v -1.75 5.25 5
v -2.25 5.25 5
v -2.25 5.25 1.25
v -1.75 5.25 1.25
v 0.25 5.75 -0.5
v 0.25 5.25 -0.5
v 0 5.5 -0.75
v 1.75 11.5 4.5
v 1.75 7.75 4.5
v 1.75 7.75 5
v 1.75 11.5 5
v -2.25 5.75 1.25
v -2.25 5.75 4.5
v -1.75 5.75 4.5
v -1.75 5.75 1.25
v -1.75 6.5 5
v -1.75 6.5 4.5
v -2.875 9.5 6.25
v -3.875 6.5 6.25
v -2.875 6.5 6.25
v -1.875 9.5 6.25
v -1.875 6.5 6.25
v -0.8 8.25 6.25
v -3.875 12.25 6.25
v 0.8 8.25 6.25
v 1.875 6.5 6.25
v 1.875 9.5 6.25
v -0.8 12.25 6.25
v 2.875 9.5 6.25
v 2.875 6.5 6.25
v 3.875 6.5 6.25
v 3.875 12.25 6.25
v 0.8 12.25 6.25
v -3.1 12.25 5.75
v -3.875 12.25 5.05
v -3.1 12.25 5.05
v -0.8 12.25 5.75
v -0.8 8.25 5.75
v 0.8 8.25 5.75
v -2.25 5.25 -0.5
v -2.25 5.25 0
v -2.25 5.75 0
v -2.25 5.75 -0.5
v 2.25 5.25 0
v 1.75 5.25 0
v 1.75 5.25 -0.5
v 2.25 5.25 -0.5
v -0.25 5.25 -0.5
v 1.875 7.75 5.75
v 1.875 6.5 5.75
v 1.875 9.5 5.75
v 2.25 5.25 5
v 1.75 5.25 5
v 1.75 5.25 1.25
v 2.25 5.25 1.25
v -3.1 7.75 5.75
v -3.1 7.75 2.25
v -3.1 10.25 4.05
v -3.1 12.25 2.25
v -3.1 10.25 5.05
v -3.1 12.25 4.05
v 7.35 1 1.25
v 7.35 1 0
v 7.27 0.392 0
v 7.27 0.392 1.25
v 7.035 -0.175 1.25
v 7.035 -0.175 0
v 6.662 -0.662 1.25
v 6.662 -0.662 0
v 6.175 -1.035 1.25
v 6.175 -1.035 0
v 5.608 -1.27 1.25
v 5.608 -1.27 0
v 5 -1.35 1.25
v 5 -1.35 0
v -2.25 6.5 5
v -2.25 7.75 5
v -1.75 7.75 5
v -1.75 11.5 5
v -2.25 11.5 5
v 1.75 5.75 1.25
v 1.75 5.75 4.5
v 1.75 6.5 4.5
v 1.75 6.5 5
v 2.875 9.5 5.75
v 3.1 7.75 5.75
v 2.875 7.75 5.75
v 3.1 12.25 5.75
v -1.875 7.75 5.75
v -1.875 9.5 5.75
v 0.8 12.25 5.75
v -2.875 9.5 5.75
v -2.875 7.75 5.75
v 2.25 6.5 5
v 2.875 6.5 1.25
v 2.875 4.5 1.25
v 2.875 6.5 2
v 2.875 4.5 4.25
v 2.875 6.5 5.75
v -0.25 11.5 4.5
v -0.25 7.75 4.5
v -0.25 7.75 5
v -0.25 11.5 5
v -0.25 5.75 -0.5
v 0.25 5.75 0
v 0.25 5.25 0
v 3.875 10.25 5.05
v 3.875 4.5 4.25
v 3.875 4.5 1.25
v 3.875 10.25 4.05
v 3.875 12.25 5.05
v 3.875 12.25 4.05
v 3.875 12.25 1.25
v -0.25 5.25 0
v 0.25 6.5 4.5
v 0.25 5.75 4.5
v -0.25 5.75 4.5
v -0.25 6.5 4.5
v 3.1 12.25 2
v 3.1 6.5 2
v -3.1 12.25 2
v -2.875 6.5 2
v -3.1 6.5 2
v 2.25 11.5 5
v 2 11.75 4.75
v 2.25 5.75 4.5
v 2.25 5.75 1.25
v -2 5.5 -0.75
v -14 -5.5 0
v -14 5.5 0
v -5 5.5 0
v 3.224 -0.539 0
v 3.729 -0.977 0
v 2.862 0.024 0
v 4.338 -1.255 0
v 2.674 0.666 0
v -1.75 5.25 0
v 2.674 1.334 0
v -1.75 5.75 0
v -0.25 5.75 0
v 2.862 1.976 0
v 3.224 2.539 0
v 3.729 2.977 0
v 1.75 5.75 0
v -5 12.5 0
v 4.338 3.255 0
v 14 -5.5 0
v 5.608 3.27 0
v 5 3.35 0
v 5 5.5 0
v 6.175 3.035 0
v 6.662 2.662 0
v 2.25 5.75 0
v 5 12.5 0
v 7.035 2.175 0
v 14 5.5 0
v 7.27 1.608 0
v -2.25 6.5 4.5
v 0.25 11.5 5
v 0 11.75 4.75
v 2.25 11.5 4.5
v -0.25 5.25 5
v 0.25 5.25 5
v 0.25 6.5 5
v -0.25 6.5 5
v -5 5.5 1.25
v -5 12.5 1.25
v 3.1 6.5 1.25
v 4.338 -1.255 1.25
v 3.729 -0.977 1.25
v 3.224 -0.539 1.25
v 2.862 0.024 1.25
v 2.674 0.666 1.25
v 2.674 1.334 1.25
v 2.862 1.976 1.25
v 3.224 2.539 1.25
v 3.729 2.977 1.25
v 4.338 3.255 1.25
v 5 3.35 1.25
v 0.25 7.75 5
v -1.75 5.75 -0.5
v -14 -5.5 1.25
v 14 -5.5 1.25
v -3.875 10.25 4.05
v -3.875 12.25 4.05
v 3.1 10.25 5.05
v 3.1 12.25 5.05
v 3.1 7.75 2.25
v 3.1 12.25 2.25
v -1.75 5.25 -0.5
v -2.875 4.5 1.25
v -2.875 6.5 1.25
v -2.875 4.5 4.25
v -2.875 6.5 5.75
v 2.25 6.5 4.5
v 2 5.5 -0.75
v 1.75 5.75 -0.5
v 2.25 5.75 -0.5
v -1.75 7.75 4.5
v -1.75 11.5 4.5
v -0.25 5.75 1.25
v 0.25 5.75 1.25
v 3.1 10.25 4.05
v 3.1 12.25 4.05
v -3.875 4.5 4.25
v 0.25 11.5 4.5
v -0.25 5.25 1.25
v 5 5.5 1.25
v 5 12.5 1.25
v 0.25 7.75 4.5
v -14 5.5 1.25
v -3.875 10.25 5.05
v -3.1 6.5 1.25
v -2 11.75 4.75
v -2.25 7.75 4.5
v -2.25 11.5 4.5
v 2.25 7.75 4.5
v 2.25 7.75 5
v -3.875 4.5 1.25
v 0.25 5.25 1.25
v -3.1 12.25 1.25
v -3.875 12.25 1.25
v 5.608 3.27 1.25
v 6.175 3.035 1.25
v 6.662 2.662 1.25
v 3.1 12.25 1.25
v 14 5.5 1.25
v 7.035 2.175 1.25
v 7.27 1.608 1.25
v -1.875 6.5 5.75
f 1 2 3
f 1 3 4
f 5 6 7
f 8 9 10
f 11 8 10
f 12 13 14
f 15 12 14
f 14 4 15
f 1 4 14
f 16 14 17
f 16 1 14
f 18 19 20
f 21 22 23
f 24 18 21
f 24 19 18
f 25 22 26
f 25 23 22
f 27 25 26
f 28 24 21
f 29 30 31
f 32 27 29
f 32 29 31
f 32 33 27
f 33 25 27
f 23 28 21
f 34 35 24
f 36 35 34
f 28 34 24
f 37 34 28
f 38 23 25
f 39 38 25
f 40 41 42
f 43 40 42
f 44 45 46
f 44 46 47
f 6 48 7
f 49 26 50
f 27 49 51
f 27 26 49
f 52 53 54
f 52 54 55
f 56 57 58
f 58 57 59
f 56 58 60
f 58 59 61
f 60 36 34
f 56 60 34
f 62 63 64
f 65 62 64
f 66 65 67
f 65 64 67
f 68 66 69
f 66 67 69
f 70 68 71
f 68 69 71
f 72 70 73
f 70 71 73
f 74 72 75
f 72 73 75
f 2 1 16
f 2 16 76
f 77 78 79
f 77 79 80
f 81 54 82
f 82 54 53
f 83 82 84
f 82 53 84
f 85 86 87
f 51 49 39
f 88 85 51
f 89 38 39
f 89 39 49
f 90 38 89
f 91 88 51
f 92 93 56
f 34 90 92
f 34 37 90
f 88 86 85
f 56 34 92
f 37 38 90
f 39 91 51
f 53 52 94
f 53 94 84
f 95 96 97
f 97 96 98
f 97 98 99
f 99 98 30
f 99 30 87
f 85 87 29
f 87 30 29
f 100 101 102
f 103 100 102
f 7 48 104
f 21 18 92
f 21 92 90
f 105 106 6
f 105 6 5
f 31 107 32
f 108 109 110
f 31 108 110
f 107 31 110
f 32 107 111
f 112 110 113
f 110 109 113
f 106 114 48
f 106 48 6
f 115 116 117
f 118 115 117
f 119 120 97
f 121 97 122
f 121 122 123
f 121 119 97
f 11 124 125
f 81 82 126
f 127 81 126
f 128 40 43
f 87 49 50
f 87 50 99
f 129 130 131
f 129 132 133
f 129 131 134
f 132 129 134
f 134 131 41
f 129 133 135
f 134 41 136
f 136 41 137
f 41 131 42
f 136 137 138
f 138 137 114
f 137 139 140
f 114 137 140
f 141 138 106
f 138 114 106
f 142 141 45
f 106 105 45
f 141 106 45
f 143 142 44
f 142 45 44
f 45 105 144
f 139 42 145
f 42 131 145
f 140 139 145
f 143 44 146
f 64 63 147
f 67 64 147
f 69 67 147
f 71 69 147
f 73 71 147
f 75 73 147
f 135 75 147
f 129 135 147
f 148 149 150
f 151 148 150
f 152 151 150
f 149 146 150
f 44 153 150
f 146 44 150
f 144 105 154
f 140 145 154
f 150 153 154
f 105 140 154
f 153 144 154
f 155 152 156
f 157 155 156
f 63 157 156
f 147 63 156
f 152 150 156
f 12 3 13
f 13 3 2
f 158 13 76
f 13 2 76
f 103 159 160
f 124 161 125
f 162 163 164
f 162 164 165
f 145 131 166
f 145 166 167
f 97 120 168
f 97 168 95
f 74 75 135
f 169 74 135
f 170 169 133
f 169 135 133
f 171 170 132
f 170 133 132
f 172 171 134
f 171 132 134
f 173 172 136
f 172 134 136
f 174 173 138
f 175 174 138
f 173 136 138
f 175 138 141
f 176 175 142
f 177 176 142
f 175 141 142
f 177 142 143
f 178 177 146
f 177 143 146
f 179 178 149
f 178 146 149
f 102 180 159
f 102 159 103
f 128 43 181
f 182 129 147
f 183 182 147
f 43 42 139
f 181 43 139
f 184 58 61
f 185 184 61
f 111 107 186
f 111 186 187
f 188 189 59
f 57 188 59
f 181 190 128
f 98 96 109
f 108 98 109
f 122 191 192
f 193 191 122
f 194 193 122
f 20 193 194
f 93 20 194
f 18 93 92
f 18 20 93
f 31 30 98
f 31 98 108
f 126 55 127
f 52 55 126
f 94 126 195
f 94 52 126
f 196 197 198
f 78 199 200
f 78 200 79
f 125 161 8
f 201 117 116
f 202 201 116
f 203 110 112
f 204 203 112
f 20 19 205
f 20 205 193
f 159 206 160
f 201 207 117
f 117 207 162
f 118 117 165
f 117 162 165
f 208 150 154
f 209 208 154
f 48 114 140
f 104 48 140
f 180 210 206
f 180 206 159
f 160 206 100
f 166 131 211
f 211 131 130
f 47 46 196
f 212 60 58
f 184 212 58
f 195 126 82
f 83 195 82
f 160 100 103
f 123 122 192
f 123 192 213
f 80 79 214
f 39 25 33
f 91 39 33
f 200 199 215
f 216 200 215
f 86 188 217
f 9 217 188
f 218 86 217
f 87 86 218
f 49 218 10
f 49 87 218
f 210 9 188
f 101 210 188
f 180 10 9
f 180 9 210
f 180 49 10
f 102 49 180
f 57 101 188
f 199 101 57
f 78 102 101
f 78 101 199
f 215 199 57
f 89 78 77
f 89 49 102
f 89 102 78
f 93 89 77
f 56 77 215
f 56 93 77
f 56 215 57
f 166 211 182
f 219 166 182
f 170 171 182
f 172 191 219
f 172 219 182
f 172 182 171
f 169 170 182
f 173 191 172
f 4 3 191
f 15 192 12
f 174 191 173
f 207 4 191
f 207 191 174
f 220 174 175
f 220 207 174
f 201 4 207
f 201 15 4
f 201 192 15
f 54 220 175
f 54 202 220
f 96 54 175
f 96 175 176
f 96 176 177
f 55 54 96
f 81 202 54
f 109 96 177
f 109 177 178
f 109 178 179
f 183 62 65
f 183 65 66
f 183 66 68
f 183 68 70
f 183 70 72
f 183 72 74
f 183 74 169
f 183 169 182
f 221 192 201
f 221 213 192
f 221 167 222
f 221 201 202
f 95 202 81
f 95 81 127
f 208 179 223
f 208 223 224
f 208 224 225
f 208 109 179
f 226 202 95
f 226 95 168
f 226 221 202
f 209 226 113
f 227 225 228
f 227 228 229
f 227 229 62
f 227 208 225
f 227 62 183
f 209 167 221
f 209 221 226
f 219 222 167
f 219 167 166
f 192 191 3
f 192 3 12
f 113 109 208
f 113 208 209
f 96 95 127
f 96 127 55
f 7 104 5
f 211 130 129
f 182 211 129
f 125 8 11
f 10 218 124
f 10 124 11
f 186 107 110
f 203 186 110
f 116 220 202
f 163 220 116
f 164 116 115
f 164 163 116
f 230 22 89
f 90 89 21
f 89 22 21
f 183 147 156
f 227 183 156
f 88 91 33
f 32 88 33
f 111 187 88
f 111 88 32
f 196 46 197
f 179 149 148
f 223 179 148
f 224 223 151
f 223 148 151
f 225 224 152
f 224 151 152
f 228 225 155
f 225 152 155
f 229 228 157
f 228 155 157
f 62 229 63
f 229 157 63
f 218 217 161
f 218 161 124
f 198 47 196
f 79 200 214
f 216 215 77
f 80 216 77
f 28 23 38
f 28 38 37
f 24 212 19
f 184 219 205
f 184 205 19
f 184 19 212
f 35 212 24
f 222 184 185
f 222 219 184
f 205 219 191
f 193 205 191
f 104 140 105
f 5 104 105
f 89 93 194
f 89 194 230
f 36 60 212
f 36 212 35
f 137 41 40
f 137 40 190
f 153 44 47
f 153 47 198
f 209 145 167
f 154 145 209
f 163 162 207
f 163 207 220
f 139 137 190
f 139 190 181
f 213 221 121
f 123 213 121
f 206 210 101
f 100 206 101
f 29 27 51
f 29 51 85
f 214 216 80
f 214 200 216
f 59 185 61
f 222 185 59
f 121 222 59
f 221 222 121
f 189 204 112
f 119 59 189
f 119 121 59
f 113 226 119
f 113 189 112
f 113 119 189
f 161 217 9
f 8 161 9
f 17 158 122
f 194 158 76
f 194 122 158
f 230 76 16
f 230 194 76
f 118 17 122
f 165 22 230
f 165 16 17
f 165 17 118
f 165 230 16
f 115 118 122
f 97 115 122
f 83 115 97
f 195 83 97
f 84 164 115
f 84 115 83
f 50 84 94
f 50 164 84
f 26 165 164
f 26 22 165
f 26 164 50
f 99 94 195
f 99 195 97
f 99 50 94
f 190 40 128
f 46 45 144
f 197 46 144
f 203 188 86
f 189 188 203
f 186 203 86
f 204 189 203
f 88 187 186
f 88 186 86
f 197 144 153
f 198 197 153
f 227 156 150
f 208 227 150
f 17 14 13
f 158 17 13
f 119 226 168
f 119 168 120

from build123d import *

# Parameters (mm, degrees)
CROQUIS1_W          = 10
CROQUIS1_H          = 7
EXTRUIR1_DEPTH      = 1.25
CROQUIS2_W          = 7.75
CROQUIS2_H          = 7.75
EXTRUIR2_DEPTH      = 5
CROQUIS3_W          = 6.199548142
CROQUIS3_H          = 3.5
EXTRUIR3_DEPTH      = 4.5
CROQUIS4_W          = 5.75
CROQUIS4_H          = 2
EXTRUIR4_DEPTH      = 5
CHAFL_N1_SIZE       = 2
CROQUIS5_W          = 6.199548142
CROQUIS5_H          = 0.75
EXTRUIR5_DEPTH      = 5.75
CROQUIS6_W          = 1
CROQUIS6_H          = 3
CROQUIS6_W_2        = 0.8
CROQUIS6_H_2        = 4
EXTRUIR6_DEPTH      = 0.5
EXTRUIR7_REACH      = 24.69
CROQUIS7_W          = 1
CROQUIS7_H          = 2
EXTRUIR8_DEPTH      = 4
EXTRUIR8_DEPTH_BACK = 2.5
CROQUIS8_W          = 0.5
CROQUIS8_H          = 0.5
CHAFL_N2_SIZE       = 0.25
CROQUIS9_W          = 0.5
CROQUIS9_H          = 0.5
EXTRUIR9_DEPTH      = 5.75
CHAFL_N3_SIZE       = 0.25


with BuildPart() as part:
    # Croquis1 → Extruir1 (new body)
    with BuildSketch(Plane.XY):
        with BuildLine():
            Line((-14, -5.5), (14, -5.5))
            Line((14, -5.5), (14, 5.5))
            Line((14, 5.5), (5, 5.5))
            Line((5, 5.5), (5, 3.35))
            ThreePointArc((5, 3.35), (6.661700936, 2.661700936), (7.35, 1))
            ThreePointArc((7.35, 1), (6.661700936, -0.661700936), (5, -1.35))
            Line((5, -1.35), (5, -1.5))
            Line((5, -1.5), (-5, -1.5))
            Line((-5, -1.5), (-5, 5.5))
            Line((-5, 5.5), (-14, 5.5))
            Line((-14, 5.5), (-14, -5.5))
        make_face()
        with Locations((0, 9)):
            Rectangle(CROQUIS1_W, CROQUIS1_H)
        with BuildLine():
            Line((5, 3.35), (5, 5.5))
            Line((5, 5.5), (-5, 5.5))
            Line((-5, 5.5), (-5, -1.5))
            Line((-5, -1.5), (5, -1.5))
            Line((5, -1.5), (5, -1.35))
            ThreePointArc((5, -1.35), (2.65, 1), (5, 3.35))
        make_face()
    extrude(amount=EXTRUIR1_DEPTH)

    # Croquis2 → Extruir2 (add)
    with BuildSketch(Plane.XY.offset(1.25)):
        with Locations((0, 8.375)):
            Rectangle(CROQUIS2_W, CROQUIS2_H)
    extrude(amount=EXTRUIR2_DEPTH)

    # Croquis3 → Extruir3 (cut)
    with BuildSketch(Plane(origin=(0, 12.25, 0), x_dir=(-1, 0, 0), z_dir=(0, 1, 0))):
        with Locations((0, 4)):
            Rectangle(CROQUIS3_W, CROQUIS3_H)
    extrude(amount=-EXTRUIR3_DEPTH, mode=Mode.SUBTRACT)

    # Croquis4 → Extruir4 (cut)
    with BuildSketch(Plane.XY.offset(6.25)):
        with Locations((0, 5.5)):
            Rectangle(CROQUIS4_W, CROQUIS4_H)
    extrude(amount=-EXTRUIR4_DEPTH, mode=Mode.SUBTRACT)

    # Chaflán1
    chafl_n1_edges = [part.edges().sort_by_distance(p)[0] for p in [
        (3.375, 4.5, 6.25),
        (-3.375, 4.5, 6.25),
    ]]
    chamfer(chafl_n1_edges, length=CHAFL_N1_SIZE)

    # Croquis5 → Extruir5 (cut)
    with BuildSketch(Plane(origin=(0, 12.25, 0), x_dir=(-1, 0, 0), z_dir=(0, 1, 0))):
        with Locations((0, 1.625)):
            Rectangle(CROQUIS5_W, CROQUIS5_H)
    extrude(amount=-EXTRUIR5_DEPTH, mode=Mode.SUBTRACT)

    # Croquis6 → Extruir6 (cut)
    with BuildSketch(Plane.XY.offset(6.25)):
        with Locations((-2.375, 8)):
            Rectangle(CROQUIS6_W, CROQUIS6_H)
        with Locations((0.4, 10.25)):
            Rectangle(CROQUIS6_W_2, CROQUIS6_H_2)
        with Locations((-0.4, 10.25)):
            Rectangle(CROQUIS6_W_2, CROQUIS6_H_2)
        with Locations((2.375, 8)):
            Rectangle(CROQUIS6_W, CROQUIS6_H)
    extrude(amount=-EXTRUIR6_DEPTH, mode=Mode.SUBTRACT)

    # Extruir7: up to this face of the body (flat: up to its plane)
    extruir7_end = Plane(part.part.faces().sort_by_distance((-3.875, 8.549603175, 3.650226757))[0])
    # Croquis7 → Extruir7 (cut, up to the picked face)
    with BuildSketch(Plane(origin=(3.875, 0, 0), x_dir=(0, 0, -1), z_dir=(1, 0, 0)), mode=Mode.PRIVATE) as extruir7_sk1:
        with Locations((-4.55, 11.25)):
            Rectangle(CROQUIS7_W, CROQUIS7_H)
    extruir7_tool1 = split(extrude(extruir7_sk1.sketch, amount=-EXTRUIR7_REACH, mode=Mode.PRIVATE), bisect_by=extruir7_end, keep=Keep.BOTH, mode=Mode.PRIVATE)
    add(extruir7_tool1.solids().sort_by(Axis((3.875, 11.25, 4.55), (-1, 0, 0)))[0], mode=Mode.SUBTRACT)

    # Croquis8 → Extruir8 (add, two sides: drawn at the far end of the back side and taken through both)
    with BuildSketch(Plane(origin=(0, 7.75, 0), x_dir=(-1, 0, 0), z_dir=(0, 1, 0)).offset(-EXTRUIR8_DEPTH_BACK)):
        with Locations((0, 4.75)):
            Rectangle(CROQUIS8_W, CROQUIS8_H)
        with Locations((2, 4.75)):
            Rectangle(CROQUIS8_W, CROQUIS8_H)
        with Locations((-2, 4.75)):
            Rectangle(CROQUIS8_W, CROQUIS8_H)
    extrude(amount=EXTRUIR8_DEPTH + EXTRUIR8_DEPTH_BACK)

    # Chaflán2
    chafl_n2_edges = [part.edges().sort_by_distance(p)[0] for p in [
        (0.25, 11.75, 4.75),
        (0, 11.75, 4.5),
        (-0.25, 11.75, 4.75),
        (0, 11.75, 5),
        (-1.75, 11.75, 4.75),
        (-2, 11.75, 4.5),
        (-2.25, 11.75, 4.75),
        (-2, 11.75, 5),
        (1.75, 11.75, 4.75),
        (2, 11.75, 5),
        (2.25, 11.75, 4.75),
        (2, 11.75, 4.5),
    ]]
    chamfer(chafl_n2_edges, length=CHAFL_N2_SIZE - 0.0001)  # a hair under: the kernel refuses the full size

    # Croquis9 → Extruir9 (add)
    with BuildSketch(Plane.XY.offset(5)):
        with Locations((-2, 5.5)):
            Rectangle(CROQUIS9_W, CROQUIS9_H)
        with Locations((0, 5.5)):
            Rectangle(CROQUIS9_W, CROQUIS9_H)
        with Locations((2, 5.5)):
            Rectangle(CROQUIS9_W, CROQUIS9_H)
    extrude(amount=-EXTRUIR9_DEPTH)

    # Chaflán3
    chafl_n3_edges = [part.edges().sort_by_distance(p)[0] for p in [
        (-2, 5.25, -0.75),
        (-2, 5.75, -0.75),
        (-1.75, 5.5, -0.75),
        (-2.25, 5.5, -0.75),
        (0, 5.75, -0.75),
        (0, 5.25, -0.75),
        (-0.25, 5.5, -0.75),
        (0.25, 5.5, -0.75),
        (2, 5.75, -0.75),
        (2, 5.25, -0.75),
        (1.75, 5.5, -0.75),
        (2.25, 5.5, -0.75),
    ]]
    chamfer(chafl_n3_edges, length=CHAFL_N3_SIZE - 0.0001)  # a hair under: the kernel refuses the full size


solid = part.part
